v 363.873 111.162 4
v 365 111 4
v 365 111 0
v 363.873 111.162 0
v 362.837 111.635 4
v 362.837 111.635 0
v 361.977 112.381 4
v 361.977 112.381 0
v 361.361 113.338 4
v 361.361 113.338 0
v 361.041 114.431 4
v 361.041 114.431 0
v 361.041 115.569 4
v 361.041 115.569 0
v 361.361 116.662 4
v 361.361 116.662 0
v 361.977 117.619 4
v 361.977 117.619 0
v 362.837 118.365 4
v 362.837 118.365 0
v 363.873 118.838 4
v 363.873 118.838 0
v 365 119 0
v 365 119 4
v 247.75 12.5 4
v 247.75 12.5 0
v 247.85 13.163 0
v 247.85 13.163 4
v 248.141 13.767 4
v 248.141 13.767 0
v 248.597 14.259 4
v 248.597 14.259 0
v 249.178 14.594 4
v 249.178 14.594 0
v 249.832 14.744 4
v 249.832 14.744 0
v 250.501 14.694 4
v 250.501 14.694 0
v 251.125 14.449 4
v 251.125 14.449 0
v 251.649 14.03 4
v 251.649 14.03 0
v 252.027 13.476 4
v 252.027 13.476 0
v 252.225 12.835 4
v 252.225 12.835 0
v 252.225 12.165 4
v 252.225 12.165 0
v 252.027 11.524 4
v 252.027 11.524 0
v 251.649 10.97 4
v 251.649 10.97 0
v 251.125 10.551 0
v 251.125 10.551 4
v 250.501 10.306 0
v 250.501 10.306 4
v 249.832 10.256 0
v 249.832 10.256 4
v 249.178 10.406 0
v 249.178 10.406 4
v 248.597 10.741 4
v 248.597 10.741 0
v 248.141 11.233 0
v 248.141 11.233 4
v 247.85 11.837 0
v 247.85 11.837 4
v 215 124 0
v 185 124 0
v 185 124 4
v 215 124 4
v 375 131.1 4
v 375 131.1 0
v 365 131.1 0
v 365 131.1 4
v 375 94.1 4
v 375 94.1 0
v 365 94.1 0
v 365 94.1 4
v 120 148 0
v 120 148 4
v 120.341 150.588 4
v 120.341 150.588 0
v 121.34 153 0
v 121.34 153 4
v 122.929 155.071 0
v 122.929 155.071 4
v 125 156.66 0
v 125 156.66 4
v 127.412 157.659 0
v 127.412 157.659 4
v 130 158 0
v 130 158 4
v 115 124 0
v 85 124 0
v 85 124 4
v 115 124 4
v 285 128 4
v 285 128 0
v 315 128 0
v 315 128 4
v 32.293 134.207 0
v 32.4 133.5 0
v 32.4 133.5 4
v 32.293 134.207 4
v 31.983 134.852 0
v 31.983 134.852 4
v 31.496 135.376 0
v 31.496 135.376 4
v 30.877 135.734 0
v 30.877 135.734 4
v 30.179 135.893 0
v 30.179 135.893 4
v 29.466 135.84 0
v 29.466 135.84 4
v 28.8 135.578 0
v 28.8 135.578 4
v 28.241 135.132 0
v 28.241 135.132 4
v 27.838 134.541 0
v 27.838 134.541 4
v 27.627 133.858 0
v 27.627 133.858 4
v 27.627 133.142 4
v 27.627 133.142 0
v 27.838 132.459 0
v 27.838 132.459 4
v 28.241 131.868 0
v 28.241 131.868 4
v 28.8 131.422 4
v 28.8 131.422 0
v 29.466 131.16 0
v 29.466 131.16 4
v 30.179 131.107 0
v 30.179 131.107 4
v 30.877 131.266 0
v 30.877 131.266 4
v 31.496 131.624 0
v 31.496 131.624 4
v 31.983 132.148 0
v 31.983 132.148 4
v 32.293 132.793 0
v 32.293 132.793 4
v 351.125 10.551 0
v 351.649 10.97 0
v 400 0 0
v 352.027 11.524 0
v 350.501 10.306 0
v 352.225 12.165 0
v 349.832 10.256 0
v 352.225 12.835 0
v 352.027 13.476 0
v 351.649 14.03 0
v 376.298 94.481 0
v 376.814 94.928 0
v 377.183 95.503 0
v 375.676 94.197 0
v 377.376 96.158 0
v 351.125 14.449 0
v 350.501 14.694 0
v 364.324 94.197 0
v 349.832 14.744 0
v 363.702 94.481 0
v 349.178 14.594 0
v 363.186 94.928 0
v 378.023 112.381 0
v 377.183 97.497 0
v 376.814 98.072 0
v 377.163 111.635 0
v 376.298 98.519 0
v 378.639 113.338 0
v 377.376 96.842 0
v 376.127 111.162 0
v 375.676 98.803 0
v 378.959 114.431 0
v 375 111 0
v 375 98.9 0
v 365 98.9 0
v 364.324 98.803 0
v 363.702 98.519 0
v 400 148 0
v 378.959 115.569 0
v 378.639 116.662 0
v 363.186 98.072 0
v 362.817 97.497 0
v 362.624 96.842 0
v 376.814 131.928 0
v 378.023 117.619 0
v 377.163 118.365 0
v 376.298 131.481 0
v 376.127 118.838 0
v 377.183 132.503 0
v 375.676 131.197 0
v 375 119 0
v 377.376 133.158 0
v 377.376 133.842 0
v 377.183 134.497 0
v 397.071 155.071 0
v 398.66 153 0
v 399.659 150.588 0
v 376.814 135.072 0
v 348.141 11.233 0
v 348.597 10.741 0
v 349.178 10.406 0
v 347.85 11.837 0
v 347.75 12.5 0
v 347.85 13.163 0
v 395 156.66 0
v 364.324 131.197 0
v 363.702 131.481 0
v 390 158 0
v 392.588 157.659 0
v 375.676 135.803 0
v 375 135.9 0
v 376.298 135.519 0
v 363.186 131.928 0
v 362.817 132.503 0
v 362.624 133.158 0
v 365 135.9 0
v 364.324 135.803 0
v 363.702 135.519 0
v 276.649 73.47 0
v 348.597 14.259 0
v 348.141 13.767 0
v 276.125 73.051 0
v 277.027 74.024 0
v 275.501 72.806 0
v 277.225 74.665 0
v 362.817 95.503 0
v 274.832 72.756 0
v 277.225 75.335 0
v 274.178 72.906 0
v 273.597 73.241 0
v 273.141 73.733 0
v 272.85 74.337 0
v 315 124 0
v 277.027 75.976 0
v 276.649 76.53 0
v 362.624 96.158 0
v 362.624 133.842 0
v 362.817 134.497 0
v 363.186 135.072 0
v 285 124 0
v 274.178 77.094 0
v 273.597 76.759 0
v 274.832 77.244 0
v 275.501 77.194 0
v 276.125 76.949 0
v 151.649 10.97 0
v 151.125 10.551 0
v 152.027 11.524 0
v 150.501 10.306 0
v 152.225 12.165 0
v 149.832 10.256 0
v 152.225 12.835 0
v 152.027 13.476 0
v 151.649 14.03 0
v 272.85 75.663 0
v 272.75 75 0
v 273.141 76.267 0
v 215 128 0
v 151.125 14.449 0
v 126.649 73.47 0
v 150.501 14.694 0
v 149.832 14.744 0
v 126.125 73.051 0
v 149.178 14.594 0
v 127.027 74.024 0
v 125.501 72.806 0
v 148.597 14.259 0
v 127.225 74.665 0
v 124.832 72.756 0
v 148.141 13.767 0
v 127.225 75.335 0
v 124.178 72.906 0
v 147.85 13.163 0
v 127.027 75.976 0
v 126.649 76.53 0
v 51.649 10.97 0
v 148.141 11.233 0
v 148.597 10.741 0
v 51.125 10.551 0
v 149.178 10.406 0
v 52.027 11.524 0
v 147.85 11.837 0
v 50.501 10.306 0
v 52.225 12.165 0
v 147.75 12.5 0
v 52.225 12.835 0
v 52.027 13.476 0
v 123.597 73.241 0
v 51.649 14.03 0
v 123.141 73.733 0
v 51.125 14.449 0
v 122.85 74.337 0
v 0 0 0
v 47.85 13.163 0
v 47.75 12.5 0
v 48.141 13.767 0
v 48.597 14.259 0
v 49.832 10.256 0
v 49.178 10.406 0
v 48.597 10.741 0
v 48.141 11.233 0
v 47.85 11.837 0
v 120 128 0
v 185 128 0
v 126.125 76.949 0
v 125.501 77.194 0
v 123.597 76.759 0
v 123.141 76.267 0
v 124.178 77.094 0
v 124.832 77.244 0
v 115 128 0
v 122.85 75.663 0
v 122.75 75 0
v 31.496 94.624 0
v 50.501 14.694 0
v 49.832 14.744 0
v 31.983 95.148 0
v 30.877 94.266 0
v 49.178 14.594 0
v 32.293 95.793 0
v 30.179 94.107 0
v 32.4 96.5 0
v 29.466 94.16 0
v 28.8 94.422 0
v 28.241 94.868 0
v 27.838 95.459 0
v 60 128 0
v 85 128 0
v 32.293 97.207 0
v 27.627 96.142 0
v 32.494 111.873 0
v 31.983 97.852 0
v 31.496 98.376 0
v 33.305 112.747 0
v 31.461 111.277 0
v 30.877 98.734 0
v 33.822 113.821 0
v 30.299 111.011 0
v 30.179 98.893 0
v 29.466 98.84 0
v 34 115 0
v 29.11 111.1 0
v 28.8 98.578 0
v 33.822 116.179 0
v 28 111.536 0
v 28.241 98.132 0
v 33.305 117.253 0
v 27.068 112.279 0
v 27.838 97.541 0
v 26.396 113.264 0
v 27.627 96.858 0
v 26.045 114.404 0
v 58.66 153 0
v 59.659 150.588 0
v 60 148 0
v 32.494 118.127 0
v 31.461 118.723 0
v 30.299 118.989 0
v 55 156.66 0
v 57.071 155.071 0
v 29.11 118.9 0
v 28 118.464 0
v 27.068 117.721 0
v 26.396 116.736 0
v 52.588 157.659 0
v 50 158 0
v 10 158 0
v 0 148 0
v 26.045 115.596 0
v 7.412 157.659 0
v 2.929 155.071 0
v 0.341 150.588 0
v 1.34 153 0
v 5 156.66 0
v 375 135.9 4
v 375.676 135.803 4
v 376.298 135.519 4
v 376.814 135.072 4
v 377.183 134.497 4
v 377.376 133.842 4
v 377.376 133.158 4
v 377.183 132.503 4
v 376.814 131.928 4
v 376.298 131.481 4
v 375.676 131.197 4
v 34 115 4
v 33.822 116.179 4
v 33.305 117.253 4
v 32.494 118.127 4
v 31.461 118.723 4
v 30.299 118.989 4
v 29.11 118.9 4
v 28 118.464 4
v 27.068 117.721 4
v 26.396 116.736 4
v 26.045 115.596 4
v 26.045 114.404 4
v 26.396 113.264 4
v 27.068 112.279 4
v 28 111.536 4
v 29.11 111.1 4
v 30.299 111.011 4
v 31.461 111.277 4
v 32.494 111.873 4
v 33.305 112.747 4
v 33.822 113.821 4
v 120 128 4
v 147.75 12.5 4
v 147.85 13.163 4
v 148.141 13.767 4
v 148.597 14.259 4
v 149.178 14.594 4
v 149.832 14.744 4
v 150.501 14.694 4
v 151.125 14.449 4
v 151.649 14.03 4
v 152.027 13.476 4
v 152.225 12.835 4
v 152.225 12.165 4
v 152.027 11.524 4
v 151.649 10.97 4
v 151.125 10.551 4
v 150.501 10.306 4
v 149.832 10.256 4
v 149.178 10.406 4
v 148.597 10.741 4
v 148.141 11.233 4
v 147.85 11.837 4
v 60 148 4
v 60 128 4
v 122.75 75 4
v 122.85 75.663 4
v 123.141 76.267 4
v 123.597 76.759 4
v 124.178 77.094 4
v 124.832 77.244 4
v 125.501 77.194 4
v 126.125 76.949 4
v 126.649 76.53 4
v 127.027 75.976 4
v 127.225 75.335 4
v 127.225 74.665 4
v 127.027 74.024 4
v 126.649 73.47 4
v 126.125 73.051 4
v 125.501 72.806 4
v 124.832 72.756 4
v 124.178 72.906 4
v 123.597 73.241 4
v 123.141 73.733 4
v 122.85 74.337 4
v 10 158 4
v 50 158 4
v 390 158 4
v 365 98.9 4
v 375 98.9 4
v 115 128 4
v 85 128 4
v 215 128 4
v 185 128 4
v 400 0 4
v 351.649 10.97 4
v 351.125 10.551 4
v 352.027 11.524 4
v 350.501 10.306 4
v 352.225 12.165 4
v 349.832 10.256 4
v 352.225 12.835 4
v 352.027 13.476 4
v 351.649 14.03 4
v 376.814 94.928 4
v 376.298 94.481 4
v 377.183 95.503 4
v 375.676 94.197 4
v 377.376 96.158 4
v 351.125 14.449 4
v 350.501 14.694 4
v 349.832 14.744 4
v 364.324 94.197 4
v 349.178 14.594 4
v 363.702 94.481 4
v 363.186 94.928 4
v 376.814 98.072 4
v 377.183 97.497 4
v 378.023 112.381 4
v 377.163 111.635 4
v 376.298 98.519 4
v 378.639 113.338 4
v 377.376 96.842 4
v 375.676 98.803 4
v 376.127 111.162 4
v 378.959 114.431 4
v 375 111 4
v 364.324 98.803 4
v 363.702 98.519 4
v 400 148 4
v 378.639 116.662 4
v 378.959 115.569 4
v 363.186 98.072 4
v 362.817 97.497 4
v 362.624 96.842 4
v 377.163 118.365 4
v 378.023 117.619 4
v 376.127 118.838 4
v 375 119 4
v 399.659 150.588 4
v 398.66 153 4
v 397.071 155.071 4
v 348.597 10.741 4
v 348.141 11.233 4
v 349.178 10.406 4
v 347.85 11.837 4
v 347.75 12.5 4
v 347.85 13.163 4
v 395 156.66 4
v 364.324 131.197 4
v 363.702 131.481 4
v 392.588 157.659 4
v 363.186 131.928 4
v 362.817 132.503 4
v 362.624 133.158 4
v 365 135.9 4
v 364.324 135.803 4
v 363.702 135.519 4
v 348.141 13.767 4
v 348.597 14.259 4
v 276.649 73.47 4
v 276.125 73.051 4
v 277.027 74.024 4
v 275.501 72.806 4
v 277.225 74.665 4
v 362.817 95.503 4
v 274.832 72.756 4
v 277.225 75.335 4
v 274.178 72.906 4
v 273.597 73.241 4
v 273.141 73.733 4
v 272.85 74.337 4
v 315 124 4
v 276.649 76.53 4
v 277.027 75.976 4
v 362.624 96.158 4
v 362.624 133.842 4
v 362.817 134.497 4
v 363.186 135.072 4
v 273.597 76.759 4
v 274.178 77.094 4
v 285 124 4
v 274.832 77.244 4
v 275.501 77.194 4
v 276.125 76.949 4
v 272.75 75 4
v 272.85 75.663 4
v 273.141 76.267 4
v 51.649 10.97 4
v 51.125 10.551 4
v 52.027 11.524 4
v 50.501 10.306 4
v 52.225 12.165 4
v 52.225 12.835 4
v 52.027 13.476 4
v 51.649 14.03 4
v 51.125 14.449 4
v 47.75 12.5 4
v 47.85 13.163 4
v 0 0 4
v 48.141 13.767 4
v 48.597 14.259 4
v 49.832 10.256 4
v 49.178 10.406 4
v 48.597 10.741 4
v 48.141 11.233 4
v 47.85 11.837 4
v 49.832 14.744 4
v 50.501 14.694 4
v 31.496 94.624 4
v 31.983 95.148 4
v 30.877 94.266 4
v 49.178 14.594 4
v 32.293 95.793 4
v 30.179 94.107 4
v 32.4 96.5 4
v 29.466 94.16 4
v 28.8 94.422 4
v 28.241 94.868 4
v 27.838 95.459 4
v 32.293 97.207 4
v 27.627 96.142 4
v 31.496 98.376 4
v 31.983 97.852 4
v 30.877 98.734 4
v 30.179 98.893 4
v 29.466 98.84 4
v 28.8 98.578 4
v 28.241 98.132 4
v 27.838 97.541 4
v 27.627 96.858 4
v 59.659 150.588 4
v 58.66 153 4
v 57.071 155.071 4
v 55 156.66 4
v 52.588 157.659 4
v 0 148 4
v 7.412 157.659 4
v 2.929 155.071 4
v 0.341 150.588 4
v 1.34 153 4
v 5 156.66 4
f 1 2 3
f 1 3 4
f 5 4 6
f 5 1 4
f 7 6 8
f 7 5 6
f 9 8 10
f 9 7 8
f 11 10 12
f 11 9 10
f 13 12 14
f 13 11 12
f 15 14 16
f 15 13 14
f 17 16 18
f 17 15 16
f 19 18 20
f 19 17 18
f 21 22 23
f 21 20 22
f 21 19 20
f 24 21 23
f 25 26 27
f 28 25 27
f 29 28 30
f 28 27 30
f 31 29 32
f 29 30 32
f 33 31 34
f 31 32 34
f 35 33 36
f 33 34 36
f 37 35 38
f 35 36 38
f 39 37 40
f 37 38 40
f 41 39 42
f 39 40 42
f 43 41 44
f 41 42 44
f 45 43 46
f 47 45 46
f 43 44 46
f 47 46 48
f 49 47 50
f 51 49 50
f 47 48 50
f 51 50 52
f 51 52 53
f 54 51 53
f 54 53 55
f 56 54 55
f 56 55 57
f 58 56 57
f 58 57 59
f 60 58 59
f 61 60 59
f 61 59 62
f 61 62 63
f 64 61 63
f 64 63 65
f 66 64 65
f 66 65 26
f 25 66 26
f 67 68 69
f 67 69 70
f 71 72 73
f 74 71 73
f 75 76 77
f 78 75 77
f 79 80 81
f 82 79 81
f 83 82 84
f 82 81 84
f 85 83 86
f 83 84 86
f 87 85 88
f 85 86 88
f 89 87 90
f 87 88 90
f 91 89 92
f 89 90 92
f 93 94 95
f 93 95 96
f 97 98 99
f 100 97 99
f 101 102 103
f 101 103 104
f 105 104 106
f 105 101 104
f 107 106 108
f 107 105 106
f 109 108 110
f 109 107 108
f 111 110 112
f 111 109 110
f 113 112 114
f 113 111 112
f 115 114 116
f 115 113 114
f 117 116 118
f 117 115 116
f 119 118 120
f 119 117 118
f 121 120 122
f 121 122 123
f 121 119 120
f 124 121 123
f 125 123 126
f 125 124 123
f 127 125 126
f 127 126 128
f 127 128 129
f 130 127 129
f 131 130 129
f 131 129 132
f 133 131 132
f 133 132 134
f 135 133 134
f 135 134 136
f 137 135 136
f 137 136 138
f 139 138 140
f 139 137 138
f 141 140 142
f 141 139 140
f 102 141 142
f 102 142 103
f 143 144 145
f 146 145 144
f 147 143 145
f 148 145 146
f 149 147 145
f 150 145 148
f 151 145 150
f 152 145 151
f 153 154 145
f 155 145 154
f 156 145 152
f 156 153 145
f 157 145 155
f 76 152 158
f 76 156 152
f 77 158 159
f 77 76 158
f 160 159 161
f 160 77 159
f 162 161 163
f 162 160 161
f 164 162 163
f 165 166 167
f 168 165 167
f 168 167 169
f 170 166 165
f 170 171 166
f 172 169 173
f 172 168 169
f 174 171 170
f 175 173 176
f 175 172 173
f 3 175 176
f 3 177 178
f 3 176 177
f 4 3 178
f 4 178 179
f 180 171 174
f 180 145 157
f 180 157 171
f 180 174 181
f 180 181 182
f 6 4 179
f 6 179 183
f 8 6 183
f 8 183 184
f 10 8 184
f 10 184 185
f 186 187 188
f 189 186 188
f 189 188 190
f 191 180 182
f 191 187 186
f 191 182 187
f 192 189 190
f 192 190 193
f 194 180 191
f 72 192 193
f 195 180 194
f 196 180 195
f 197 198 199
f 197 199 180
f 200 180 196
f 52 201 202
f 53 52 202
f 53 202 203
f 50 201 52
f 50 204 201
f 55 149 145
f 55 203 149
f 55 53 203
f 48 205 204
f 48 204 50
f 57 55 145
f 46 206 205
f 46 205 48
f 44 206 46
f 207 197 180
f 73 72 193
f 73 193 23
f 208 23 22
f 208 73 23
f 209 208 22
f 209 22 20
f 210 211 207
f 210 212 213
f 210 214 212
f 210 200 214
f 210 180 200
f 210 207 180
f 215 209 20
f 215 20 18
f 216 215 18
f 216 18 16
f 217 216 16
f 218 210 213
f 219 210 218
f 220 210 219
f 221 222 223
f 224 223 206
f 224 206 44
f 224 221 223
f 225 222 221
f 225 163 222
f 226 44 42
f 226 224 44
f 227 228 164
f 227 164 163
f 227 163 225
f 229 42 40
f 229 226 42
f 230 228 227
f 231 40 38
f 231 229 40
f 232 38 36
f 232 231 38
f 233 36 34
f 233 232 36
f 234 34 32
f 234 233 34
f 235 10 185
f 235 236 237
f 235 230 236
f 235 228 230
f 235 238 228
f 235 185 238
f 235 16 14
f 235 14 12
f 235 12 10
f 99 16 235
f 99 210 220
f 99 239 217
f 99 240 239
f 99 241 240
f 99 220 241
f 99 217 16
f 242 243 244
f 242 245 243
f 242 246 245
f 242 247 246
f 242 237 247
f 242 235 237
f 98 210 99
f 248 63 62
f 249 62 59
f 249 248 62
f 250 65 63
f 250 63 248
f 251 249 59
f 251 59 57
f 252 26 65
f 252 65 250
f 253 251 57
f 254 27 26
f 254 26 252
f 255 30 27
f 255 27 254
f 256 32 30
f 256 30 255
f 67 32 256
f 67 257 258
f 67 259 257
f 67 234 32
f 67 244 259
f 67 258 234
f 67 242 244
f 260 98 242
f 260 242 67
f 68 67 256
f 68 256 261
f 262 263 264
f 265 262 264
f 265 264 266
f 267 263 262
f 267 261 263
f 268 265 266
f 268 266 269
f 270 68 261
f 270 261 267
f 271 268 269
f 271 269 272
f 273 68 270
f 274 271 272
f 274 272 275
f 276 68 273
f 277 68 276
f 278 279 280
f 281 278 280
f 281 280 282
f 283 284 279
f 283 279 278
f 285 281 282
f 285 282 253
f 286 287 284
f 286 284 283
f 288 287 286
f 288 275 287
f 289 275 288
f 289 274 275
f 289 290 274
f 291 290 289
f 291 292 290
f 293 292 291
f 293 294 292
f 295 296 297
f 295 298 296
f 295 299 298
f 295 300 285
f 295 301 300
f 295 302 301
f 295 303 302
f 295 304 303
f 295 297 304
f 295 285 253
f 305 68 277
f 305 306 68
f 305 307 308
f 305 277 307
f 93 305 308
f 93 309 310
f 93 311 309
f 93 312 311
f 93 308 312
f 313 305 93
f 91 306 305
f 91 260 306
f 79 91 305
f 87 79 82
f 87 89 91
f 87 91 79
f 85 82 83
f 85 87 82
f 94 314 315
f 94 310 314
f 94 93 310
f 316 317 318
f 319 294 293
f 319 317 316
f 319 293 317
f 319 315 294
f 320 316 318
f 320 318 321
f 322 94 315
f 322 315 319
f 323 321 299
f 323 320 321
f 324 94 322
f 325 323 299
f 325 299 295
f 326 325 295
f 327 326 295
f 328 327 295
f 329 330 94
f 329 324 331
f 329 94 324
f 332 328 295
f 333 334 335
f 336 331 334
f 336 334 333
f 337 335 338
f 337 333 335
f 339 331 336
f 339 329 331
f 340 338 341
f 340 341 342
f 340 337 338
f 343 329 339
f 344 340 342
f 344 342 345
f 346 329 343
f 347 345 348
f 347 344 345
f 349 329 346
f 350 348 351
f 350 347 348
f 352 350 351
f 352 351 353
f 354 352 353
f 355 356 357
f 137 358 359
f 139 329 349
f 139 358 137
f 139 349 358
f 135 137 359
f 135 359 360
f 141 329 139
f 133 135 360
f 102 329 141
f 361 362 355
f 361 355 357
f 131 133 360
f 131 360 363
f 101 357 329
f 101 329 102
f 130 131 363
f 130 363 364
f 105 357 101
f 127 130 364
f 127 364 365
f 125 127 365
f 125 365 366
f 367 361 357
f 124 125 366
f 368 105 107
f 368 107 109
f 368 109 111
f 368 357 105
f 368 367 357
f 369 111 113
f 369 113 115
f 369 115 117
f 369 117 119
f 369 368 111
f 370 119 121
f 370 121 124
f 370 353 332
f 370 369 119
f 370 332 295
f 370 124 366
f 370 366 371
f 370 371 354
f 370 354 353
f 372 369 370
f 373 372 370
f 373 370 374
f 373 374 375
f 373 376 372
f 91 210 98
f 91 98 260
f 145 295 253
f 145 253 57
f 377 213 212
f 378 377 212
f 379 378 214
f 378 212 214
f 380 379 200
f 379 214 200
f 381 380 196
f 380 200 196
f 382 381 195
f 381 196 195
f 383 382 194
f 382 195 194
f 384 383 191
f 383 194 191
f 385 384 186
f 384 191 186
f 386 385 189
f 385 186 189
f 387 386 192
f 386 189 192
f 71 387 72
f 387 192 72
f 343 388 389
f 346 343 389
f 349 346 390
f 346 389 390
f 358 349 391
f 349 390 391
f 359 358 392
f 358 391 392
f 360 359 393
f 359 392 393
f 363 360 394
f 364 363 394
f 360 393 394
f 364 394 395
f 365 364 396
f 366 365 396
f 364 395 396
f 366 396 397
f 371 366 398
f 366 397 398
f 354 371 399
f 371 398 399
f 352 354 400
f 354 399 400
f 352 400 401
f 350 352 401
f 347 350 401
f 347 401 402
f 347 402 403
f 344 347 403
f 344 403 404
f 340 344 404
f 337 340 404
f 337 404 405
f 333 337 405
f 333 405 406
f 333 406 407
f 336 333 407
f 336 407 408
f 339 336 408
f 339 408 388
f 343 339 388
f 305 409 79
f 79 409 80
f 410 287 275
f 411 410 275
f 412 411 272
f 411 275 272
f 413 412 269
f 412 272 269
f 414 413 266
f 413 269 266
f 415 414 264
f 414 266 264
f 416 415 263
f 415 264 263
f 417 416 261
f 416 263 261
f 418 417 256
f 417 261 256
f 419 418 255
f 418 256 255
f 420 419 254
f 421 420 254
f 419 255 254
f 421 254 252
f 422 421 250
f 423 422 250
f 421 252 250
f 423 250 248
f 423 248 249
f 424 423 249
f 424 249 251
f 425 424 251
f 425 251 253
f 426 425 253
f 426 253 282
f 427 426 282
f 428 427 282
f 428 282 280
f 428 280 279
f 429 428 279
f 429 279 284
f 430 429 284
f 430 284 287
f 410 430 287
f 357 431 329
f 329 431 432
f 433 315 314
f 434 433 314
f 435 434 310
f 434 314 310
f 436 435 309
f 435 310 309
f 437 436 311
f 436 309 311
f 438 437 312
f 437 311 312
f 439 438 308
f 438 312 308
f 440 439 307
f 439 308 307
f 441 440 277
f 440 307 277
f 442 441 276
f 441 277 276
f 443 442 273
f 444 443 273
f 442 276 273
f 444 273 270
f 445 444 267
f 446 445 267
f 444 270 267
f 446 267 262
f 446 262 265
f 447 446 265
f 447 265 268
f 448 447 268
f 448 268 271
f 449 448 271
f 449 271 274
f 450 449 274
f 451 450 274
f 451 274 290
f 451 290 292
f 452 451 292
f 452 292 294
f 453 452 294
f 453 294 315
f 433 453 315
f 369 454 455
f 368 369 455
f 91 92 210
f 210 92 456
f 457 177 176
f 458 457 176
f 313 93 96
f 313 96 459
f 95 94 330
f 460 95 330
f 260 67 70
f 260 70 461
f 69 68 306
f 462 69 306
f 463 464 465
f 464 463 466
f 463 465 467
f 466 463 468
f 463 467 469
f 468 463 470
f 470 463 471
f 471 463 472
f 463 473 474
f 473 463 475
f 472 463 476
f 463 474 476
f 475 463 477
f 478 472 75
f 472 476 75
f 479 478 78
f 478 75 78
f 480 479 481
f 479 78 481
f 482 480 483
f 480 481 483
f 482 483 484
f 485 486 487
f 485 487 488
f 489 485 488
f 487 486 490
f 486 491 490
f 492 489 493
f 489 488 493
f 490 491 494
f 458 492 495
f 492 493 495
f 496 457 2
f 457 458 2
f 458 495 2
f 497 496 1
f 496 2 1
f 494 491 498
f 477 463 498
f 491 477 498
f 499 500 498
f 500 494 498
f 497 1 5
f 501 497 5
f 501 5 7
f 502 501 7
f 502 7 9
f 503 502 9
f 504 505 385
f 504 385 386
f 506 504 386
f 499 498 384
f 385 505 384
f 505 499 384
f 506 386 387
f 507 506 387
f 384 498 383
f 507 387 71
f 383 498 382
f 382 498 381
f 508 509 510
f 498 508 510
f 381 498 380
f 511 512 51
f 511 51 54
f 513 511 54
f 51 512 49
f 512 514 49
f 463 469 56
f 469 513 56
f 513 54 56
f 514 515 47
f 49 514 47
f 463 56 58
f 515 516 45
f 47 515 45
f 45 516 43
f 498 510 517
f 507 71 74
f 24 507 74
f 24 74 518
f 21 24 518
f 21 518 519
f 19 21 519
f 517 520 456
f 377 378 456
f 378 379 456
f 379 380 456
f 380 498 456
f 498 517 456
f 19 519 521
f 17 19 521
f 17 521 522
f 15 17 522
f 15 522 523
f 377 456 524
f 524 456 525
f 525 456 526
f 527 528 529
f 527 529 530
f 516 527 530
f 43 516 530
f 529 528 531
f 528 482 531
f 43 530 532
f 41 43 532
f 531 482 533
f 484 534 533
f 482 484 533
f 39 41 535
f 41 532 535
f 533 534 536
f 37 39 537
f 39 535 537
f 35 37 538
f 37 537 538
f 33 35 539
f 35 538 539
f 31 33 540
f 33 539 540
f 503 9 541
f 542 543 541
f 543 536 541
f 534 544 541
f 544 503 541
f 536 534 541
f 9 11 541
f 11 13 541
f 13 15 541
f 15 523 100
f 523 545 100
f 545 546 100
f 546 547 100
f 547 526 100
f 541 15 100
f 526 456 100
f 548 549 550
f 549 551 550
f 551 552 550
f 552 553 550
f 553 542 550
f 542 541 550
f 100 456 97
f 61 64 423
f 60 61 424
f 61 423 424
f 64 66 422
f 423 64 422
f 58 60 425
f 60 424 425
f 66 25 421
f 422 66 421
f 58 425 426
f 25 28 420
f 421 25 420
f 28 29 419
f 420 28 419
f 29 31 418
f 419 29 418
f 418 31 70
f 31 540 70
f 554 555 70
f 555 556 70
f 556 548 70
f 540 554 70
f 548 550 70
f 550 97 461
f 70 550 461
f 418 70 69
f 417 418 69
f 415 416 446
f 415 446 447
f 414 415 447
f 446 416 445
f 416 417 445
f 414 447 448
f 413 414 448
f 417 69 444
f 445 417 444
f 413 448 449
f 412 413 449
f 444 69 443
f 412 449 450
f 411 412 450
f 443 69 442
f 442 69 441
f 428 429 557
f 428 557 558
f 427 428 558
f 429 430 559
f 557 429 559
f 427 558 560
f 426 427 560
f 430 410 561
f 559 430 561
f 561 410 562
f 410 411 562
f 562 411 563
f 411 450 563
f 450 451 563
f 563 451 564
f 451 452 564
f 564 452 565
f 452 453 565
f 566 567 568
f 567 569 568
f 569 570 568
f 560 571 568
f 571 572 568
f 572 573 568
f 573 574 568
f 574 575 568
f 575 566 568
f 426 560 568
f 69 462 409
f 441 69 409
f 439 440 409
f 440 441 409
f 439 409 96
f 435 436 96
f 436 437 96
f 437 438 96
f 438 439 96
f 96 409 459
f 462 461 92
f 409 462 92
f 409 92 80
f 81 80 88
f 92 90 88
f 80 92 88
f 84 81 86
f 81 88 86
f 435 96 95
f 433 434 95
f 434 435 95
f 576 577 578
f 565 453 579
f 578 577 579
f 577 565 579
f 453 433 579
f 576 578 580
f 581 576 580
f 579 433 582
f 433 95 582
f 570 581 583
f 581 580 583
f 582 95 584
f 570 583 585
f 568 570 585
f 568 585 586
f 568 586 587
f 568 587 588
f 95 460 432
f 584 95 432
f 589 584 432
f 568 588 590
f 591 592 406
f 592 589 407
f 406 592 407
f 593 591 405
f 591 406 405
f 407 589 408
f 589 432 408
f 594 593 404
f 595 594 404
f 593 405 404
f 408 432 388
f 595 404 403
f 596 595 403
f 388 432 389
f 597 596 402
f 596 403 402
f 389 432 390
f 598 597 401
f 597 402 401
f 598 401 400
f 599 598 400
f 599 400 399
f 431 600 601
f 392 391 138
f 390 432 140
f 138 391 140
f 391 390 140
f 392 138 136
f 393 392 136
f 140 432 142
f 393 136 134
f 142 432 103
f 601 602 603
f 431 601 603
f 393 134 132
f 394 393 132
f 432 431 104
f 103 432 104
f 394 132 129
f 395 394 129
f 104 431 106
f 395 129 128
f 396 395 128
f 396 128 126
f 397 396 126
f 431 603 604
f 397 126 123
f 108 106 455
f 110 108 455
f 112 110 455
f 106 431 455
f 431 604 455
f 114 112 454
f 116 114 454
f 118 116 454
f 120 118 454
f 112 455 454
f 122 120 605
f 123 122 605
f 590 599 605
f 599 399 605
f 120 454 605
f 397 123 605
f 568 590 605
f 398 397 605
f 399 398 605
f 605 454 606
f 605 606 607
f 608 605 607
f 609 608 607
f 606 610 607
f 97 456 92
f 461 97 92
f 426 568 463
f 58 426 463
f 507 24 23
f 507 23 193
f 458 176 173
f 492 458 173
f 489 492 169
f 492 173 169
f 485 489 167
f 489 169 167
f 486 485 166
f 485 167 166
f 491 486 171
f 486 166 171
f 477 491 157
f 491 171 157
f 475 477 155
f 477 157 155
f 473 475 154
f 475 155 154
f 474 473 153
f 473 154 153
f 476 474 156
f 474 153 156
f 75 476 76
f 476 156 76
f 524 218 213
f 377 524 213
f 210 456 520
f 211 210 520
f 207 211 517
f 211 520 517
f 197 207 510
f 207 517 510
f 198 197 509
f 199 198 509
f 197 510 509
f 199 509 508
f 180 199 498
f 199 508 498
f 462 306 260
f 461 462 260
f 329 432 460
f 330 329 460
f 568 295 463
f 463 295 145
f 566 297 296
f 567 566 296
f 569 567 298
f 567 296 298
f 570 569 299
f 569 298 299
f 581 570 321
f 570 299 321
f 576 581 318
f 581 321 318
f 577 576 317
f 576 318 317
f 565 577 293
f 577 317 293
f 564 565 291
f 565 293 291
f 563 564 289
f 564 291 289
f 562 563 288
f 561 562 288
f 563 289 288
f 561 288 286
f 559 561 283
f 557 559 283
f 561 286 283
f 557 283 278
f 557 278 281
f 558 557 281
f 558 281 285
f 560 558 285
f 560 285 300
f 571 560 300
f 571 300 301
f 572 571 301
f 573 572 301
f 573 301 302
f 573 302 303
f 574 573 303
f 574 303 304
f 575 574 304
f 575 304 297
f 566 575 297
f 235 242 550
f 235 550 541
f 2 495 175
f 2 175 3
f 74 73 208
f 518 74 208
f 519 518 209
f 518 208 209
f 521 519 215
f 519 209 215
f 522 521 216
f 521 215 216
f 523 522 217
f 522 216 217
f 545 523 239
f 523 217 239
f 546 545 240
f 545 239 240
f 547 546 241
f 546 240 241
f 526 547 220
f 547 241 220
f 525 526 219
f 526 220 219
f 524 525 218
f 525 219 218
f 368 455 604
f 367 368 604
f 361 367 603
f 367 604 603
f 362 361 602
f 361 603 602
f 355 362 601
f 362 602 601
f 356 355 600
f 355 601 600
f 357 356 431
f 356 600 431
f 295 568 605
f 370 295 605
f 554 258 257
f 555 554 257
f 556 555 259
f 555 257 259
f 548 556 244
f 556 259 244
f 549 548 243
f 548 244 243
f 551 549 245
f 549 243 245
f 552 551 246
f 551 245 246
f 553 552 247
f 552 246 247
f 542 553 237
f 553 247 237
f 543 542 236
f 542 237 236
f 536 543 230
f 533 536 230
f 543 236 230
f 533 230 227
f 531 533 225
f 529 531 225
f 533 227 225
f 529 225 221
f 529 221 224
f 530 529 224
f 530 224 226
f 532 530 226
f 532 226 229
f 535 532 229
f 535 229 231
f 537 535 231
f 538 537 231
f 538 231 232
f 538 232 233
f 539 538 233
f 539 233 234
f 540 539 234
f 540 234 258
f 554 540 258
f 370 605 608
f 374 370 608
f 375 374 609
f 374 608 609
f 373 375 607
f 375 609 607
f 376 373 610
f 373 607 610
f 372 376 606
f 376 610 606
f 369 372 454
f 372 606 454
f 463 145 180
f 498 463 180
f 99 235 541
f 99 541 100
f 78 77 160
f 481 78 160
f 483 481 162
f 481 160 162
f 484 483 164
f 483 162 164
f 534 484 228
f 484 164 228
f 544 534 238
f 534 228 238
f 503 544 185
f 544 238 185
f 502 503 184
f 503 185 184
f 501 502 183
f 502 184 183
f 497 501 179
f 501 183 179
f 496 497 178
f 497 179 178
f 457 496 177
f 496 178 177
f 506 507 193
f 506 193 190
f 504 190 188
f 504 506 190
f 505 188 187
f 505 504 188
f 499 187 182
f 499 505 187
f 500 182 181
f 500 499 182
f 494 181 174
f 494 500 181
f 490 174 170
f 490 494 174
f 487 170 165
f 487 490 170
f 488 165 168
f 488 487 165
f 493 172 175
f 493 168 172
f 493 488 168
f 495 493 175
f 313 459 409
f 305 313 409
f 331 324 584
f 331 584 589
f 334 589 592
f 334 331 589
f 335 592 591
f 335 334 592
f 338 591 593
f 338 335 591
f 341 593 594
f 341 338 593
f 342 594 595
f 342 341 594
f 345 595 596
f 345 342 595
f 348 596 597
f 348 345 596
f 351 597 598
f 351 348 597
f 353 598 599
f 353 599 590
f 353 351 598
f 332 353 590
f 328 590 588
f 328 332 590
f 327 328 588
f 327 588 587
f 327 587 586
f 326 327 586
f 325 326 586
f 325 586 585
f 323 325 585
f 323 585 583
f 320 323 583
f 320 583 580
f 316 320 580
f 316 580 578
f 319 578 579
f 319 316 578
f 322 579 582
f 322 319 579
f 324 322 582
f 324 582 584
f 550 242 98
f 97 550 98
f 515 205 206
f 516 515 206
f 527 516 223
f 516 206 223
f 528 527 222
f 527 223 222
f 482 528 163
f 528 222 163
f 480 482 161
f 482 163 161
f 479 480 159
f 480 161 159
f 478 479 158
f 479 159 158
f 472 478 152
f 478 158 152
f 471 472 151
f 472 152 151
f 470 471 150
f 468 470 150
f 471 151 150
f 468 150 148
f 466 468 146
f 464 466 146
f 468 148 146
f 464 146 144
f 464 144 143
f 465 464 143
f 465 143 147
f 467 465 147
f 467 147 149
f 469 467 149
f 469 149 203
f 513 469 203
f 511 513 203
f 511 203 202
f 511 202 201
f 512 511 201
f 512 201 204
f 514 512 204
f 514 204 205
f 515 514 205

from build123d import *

# Parameters (mm, degrees)
ESBO_O1_R                = 2.4
ESBO_O1_W                = 30
ESBO_O1_H                = 4
RESSALTO_EXTRUS_O1_DEPTH = 4
ESBO_O3_R                = 4
CORTE_EXTRUS_O1_DEPTH    = 6
FURO_COM_FOLGA_DE_M41_D  = 4.5
ESBO_O7_W                = 60
ESBO_O7_H                = 2
CORTE_EXTRUS_O4_DEPTH    = 5
RESSALTO_EXTRUS_O2_DEPTH = 4


with BuildPart() as part:
    # Esboço1 → Ressalto-extrusão1 (new body)
    with BuildSketch(Plane.XY):
        with BuildLine():
            Line((0, 0), (400, 0))
            Line((400, 0), (400, 140))
            ThreePointArc((400, 140), (397.071067812, 147.071067812), (390, 150))
            Line((390, 150), (130, 150))
            ThreePointArc((130, 150), (122.928932188, 147.071067812), (120, 140))
            Line((120, 140), (120, 130))
            Line((120, 130), (60, 130))
            Line((60, 130), (60, 140))
            ThreePointArc((60, 140), (57.071067812, 147.071067812), (50, 150))
            Line((50, 150), (10, 150))
            ThreePointArc((10, 150), (2.928932188, 147.071067812), (0, 140))
            Line((0, 140), (0, 0))
        make_face()
        with Locations((30, 133.5)):
            Circle(ESBO_O1_R, mode=Mode.SUBTRACT)
        with Locations((30, 96.5)):
            Circle(ESBO_O1_R, mode=Mode.SUBTRACT)
        with Locations((100, 126)):
            Rectangle(ESBO_O1_W, ESBO_O1_H, mode=Mode.SUBTRACT)
        with Locations((200, 126)):
            Rectangle(ESBO_O1_W, ESBO_O1_H, mode=Mode.SUBTRACT)
        with Locations((300, 126)):
            Rectangle(ESBO_O1_W, ESBO_O1_H, mode=Mode.SUBTRACT)
        with BuildLine():
            Line((365, 135.9), (375, 135.9))
            ThreePointArc((375, 135.9), (377.4, 133.5), (375, 131.1))
            Line((375, 131.1), (365, 131.1))
            ThreePointArc((365, 131.1), (362.6, 133.5), (365, 135.9))
        make_face(mode=Mode.SUBTRACT)
        with BuildLine():
            Line((365, 98.9), (375, 98.9))
            ThreePointArc((375, 98.9), (377.4, 96.5), (375, 94.1))
            Line((375, 94.1), (365, 94.1))
            ThreePointArc((365, 94.1), (362.6, 96.5), (365, 98.9))
        make_face(mode=Mode.SUBTRACT)
    extrude(amount=RESSALTO_EXTRUS_O1_DEPTH)

    # Esboço3 → Corte-extrusão1 (cut)
    with BuildSketch(Plane.XY.offset(4)):
        with Locations((30, 115)):
            Circle(ESBO_O3_R)
        with BuildLine():
            Line((365, 119), (375, 119))
            ThreePointArc((375, 119), (379, 115), (375, 111))
            Line((375, 111), (365, 111))
            ThreePointArc((365, 111), (361, 115), (365, 119))
        make_face()
    extrude(amount=-CORTE_EXTRUS_O1_DEPTH, mode=Mode.SUBTRACT)

    # Furo com folga de M41 (through all)
    with Locations(Plane(origin=(350, 12.5, 4), x_dir=(1, 0, 0), z_dir=(0, 0, 1))):
        with Locations((0, 0), (-225, 62.5), (-75, 62.5), (-300, 0), (-200, 0), (-100, 0)):
            Hole(FURO_COM_FOLGA_DE_M41_D / 2)

    # Esboço7 → Corte-extrusão4 (cut, through all)
    with BuildSketch(Plane.XY.offset(4)):
        with Locations((90, 129)):
            Rectangle(ESBO_O7_W, ESBO_O7_H)
    extrude(amount=-CORTE_EXTRUS_O4_DEPTH, mode=Mode.SUBTRACT)

    # Esboço8 → Ressalto-extrusão2 (add)
    with BuildSketch(Plane.XY.offset(4)):
        with BuildLine():
            Line((10, 158), (50, 158))
            ThreePointArc((50, 158), (57.071067812, 155.071067812), (60, 148))
            Line((60, 148), (60, 140))
            ThreePointArc((60, 140), (57.071067812, 147.071067812), (50, 150))
            Line((50, 150), (10, 150))
            ThreePointArc((10, 150), (2.928932188, 147.071067812), (0, 140))
            Line((0, 140), (0, 148))
            ThreePointArc((0, 148), (2.928932188, 155.071067812), (10, 158))
        make_face()
        with BuildLine():
            Line((120, 140), (120, 148))
            ThreePointArc((120, 148), (122.928932188, 155.071067812), (130, 158))
            Line((130, 158), (390, 158))
            ThreePointArc((390, 158), (397.071067812, 155.071067812), (400, 148))
            Line((400, 148), (400, 140))
            ThreePointArc((400, 140), (397.071067812, 147.071067812), (390, 150))
            Line((390, 150), (130, 150))
            ThreePointArc((130, 150), (122.928932188, 147.071067812), (120, 140))
        make_face()
    extrude(amount=-RESSALTO_EXTRUS_O2_DEPTH)


solid = part.part
